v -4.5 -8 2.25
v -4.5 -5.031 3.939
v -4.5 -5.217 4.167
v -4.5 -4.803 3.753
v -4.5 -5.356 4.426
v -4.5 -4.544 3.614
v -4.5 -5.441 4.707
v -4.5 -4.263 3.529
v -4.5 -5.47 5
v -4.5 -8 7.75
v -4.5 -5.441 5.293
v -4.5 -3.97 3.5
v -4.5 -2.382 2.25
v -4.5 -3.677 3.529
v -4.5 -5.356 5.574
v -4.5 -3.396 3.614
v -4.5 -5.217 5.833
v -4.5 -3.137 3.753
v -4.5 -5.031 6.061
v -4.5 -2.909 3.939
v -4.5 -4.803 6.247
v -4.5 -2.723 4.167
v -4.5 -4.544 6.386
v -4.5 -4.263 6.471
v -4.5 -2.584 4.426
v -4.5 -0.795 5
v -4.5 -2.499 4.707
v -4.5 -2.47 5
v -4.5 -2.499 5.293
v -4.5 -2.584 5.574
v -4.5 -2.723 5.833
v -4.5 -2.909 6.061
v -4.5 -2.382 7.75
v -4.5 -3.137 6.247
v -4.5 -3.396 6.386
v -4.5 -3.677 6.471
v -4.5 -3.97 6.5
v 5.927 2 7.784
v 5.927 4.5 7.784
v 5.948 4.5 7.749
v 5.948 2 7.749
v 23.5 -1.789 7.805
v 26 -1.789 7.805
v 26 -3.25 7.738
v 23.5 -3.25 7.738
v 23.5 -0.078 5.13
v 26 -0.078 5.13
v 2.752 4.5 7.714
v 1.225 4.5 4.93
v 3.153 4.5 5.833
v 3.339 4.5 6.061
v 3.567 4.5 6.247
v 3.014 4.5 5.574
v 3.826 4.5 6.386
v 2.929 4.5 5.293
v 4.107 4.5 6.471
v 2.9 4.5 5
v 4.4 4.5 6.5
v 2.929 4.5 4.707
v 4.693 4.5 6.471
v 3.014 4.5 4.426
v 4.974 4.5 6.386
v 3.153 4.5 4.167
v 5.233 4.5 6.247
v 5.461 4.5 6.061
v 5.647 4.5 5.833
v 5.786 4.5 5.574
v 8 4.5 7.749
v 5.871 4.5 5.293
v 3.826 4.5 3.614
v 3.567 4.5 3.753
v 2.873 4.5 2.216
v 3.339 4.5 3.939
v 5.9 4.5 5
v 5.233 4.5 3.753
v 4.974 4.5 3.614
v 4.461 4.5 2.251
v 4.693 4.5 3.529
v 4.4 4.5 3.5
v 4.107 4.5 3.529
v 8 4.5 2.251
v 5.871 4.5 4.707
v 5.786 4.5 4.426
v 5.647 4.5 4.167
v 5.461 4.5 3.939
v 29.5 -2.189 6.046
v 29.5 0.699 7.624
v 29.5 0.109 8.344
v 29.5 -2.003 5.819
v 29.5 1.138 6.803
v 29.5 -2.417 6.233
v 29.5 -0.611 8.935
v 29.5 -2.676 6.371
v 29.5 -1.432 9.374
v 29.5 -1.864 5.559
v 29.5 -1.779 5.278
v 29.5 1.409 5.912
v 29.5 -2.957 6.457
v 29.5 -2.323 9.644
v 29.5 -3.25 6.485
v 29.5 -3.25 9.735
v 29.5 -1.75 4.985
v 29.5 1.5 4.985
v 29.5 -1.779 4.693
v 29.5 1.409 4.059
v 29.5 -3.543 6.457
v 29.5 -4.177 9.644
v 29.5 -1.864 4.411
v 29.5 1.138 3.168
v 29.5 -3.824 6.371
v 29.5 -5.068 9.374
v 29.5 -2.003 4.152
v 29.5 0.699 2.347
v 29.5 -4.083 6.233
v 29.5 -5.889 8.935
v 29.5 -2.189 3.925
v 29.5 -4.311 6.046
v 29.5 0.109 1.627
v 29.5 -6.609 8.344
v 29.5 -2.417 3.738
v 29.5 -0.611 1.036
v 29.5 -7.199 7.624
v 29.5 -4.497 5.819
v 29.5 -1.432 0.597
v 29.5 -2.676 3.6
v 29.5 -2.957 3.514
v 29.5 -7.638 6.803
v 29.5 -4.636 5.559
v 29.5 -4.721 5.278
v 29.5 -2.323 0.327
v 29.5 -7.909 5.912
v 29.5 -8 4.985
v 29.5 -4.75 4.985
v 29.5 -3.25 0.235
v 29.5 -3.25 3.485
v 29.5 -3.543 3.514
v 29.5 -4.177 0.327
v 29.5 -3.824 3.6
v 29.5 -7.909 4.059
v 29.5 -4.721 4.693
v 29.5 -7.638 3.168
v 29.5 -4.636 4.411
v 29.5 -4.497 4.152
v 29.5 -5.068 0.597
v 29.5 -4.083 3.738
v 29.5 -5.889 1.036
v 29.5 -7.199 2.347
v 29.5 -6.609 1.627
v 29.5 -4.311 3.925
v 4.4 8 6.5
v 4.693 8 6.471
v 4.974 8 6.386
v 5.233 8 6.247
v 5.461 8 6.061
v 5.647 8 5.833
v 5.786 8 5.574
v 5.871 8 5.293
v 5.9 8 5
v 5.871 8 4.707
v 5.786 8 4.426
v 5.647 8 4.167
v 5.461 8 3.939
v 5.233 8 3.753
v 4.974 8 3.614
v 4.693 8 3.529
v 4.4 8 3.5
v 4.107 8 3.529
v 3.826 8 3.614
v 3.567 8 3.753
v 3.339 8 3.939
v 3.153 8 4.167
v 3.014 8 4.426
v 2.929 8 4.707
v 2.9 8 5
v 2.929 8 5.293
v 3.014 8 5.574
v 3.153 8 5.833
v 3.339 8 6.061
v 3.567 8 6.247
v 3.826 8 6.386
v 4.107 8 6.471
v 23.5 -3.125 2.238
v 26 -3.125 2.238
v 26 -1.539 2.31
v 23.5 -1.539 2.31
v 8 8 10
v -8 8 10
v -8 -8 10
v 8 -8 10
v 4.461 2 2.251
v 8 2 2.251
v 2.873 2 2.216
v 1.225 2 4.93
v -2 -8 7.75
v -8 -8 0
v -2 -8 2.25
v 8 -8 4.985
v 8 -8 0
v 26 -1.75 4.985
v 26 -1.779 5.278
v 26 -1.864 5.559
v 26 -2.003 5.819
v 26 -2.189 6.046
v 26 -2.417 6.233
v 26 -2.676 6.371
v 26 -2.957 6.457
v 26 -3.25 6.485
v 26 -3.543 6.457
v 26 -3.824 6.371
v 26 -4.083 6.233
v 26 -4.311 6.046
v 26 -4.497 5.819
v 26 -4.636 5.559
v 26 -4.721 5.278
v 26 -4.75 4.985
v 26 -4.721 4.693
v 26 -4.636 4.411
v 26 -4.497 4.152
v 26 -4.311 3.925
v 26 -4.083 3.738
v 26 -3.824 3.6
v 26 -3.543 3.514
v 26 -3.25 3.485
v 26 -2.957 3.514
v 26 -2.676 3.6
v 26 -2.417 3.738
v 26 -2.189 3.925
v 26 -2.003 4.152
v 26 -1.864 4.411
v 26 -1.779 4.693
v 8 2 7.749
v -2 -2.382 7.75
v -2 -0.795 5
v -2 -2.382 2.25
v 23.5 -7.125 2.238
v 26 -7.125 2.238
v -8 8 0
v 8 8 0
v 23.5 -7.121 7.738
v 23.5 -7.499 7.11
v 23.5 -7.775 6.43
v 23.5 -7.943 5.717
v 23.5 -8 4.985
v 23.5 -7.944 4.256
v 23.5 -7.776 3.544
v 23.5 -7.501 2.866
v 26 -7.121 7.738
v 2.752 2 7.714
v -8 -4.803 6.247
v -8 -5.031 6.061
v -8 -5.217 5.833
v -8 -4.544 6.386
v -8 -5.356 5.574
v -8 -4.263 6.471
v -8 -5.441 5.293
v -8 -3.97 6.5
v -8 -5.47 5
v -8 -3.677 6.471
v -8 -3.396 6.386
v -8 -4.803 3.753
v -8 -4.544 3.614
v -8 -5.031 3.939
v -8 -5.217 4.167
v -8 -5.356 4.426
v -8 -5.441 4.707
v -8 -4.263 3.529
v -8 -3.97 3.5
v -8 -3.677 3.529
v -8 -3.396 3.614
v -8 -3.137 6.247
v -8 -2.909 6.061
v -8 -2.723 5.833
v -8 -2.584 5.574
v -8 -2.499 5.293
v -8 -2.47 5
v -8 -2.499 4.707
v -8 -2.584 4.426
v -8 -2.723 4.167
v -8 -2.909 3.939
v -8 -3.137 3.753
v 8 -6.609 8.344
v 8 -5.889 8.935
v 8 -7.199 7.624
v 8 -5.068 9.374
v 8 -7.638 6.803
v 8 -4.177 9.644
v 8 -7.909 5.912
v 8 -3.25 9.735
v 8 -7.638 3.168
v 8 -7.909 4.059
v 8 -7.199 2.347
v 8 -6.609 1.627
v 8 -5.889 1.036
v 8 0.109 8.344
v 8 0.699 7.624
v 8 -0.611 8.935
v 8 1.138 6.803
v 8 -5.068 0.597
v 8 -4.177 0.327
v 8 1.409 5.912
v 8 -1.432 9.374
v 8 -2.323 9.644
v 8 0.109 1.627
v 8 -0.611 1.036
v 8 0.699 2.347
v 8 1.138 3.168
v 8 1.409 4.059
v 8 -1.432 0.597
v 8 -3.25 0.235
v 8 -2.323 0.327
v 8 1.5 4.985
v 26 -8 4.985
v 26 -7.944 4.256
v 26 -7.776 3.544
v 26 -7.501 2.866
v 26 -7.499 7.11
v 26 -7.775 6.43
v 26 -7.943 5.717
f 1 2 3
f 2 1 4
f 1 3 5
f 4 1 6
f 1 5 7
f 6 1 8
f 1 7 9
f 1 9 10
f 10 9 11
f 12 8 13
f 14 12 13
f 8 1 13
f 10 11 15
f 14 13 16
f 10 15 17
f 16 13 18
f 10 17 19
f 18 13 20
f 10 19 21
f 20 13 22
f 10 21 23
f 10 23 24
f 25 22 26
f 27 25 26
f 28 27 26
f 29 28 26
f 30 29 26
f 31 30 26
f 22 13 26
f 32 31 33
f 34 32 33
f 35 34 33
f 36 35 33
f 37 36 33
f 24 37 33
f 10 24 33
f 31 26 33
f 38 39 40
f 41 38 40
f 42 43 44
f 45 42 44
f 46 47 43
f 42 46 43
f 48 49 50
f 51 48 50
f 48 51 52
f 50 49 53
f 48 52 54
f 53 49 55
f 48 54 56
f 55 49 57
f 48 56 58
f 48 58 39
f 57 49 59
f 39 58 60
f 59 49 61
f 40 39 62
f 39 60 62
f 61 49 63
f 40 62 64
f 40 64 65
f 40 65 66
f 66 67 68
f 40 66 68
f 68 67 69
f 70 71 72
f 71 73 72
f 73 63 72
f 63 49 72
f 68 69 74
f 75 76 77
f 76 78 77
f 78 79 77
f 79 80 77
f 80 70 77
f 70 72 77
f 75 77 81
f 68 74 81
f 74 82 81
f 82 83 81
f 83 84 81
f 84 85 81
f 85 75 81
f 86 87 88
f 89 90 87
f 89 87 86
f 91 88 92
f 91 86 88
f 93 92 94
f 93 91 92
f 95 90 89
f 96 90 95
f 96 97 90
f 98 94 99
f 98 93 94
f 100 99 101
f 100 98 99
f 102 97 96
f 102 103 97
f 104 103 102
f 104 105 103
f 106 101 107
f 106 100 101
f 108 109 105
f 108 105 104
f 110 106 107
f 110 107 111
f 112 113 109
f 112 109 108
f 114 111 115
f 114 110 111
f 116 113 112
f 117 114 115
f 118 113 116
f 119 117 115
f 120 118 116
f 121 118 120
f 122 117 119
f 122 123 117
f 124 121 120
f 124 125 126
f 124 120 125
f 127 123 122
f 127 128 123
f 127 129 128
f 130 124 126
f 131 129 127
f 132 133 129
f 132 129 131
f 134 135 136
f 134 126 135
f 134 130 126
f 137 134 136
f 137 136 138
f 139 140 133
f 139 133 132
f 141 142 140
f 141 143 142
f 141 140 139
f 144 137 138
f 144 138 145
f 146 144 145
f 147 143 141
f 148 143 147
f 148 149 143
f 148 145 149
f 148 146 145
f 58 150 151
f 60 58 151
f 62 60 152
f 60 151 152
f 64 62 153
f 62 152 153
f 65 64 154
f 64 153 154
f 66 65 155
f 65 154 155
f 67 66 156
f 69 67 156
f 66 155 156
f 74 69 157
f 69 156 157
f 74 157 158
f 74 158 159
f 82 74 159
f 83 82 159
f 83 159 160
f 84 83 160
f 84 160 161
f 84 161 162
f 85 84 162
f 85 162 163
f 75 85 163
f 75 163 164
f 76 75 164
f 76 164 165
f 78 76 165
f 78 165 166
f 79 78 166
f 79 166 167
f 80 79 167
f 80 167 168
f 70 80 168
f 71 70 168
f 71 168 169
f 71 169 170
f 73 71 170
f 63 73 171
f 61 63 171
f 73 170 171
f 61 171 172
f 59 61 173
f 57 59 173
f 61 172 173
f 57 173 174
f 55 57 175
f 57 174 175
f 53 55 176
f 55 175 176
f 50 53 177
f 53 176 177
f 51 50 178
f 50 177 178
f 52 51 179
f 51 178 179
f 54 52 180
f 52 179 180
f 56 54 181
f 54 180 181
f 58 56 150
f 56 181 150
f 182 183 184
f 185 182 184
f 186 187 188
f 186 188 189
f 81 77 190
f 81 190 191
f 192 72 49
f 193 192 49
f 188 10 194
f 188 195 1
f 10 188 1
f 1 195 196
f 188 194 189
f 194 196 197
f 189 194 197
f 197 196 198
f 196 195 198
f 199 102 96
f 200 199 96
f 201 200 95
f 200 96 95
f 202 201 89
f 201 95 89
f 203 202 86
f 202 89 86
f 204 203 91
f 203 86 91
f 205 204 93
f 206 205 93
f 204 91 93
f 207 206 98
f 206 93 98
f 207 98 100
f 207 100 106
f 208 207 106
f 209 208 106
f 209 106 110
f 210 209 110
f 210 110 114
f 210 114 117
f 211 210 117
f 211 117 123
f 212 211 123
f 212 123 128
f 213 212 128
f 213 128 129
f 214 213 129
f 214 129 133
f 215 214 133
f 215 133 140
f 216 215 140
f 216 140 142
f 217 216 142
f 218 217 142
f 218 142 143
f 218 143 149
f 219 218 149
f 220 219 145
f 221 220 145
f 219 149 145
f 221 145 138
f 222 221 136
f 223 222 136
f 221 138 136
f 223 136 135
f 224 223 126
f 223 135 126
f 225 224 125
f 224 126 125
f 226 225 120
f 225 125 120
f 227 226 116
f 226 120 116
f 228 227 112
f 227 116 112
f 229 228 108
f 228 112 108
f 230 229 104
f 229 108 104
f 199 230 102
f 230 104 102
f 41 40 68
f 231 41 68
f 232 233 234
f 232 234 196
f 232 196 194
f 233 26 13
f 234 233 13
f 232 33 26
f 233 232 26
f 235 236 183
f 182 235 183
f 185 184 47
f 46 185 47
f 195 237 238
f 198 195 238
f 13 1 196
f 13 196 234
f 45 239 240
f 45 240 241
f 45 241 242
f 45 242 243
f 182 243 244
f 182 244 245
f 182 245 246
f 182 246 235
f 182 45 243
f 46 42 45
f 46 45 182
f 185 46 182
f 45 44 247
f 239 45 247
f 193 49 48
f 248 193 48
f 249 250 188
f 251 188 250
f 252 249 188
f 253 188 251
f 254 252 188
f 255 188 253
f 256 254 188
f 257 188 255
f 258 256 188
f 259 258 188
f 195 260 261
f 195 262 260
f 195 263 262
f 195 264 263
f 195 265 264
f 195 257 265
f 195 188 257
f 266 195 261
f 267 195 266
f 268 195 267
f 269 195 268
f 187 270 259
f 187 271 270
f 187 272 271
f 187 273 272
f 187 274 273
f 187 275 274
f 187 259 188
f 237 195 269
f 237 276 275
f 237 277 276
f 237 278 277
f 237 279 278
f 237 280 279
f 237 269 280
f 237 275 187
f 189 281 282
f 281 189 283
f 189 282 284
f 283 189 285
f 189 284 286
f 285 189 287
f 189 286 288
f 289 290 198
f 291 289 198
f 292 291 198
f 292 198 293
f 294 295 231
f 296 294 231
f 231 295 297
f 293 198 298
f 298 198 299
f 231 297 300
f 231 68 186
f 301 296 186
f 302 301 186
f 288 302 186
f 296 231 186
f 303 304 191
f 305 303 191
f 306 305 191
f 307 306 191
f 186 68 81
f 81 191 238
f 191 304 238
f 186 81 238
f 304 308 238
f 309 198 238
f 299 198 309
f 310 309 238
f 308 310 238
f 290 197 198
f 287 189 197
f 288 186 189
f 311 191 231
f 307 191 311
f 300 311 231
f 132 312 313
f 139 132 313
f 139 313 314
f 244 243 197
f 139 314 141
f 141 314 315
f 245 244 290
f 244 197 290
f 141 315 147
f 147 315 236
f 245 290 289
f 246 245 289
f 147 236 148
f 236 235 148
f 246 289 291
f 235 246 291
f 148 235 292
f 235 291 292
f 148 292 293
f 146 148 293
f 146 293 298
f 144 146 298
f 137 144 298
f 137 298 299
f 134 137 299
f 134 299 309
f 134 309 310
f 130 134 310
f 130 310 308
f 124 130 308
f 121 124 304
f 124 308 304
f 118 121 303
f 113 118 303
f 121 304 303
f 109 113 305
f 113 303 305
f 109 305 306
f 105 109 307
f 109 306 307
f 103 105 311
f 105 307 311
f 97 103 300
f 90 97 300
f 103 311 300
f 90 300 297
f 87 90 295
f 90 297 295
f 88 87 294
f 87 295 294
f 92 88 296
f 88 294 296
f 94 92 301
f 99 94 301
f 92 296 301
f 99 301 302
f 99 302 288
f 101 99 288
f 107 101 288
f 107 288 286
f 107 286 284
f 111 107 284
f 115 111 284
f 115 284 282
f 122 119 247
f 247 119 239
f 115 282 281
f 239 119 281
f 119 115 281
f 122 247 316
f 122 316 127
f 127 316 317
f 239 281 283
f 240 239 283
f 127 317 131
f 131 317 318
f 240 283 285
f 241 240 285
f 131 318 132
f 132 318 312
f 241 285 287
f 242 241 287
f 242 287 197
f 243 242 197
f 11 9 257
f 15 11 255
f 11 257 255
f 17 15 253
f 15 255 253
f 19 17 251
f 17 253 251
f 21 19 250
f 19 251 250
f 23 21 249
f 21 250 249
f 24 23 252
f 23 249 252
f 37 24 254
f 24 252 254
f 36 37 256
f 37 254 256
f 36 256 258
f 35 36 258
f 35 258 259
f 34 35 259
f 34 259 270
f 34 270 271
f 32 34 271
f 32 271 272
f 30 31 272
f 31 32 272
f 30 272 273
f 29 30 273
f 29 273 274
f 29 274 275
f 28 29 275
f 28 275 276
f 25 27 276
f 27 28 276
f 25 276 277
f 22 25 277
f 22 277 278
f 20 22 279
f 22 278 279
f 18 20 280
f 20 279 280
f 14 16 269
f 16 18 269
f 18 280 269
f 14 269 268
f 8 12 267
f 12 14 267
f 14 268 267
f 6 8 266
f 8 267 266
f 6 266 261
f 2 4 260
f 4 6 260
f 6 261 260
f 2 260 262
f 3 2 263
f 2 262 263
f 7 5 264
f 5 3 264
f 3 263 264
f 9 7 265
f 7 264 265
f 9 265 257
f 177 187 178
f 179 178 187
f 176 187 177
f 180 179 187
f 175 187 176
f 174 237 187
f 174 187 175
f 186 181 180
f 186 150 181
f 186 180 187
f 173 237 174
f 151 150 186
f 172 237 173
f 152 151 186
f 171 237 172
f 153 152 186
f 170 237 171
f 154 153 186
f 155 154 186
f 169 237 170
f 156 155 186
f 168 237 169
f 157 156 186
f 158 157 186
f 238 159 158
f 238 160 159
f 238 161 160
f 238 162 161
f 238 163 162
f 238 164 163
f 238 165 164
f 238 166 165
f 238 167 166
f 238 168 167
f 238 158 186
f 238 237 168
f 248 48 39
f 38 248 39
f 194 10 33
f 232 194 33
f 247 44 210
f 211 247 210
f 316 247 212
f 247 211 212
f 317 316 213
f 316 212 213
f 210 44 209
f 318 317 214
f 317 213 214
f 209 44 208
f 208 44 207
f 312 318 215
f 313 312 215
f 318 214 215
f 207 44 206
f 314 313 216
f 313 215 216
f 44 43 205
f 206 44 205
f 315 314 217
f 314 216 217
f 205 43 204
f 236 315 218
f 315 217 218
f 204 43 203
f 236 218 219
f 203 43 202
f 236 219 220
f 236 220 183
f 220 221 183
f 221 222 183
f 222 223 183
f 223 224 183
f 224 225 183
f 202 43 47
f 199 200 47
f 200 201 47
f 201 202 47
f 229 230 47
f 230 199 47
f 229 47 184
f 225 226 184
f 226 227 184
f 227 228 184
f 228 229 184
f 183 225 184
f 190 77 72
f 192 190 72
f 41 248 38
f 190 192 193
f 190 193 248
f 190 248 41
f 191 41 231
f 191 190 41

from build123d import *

# Parameters (mm, degrees)
SKETCH1_W           = 16
SKETCH1_H           = 16
BOSS_EXTRUDE1_DEPTH = 10
SKETCH2_R           = 1.5
CUT_EXTRUDE1_DEPTH  = 6
SKETCH3_R           = 1.5
CUT_EXTRUDE2_DEPTH  = 6
CUT_EXTRUDE3_START  = -3.5
CUT_EXTRUDE3_DEPTH  = 2.5
CUT_EXTRUDE5_START  = -3.5
SKETCH6_W           = 5.5
SKETCH6_H           = 8.06
CUT_EXTRUDE5_DEPTH  = 2.5
CUT_EXTRUDE6_START  = -3.5
SKETCH7_W           = 7.078957324
SKETCH7_H           = 5.4986679
CUT_EXTRUDE6_DEPTH  = 2.5
SKETCH9_R           = 4.75
BOSS_EXTRUDE2_DEPTH = 21.5
SKETCH10_R          = 1.5
CUT_EXTRUDE7_DEPTH  = 6
CUT_EXTRUDE9_START  = -3.5
SKETCH11_R          = 1.5
CUT_EXTRUDE9_DEPTH  = 2.5


with BuildPart() as part:
    # Sketch1 → Boss-Extrude1 (new body)
    with BuildSketch(Plane.XY):
        Rectangle(SKETCH1_W, SKETCH1_H)
    extrude(amount=BOSS_EXTRUDE1_DEPTH)

    # Sketch2 → Cut-Extrude1 (cut)
    with BuildSketch(Plane.ZY.offset(8)):
        with Locations(Location((5, -3.97, 0), (0, 0, 270))):
            Circle(SKETCH2_R)
    extrude(amount=-CUT_EXTRUDE1_DEPTH, mode=Mode.SUBTRACT)

    # Sketch3 → Cut-Extrude2 (cut)
    with BuildSketch(Plane(origin=(0, 8, 0), x_dir=(1, 0, 0), z_dir=(0, 1, 0))):
        with Locations(Location((4.4, -5, 0), (0, 0, 270))):
            Circle(SKETCH3_R)
    extrude(amount=-CUT_EXTRUDE2_DEPTH, mode=Mode.SUBTRACT)

    # Sketch4 → Cut-Extrude3 (cut)
    with BuildSketch(Plane.ZY.offset(8).offset(CUT_EXTRUDE3_START)):
        Polygon((7.75, -2.38228676), (5, -0.794573519), (2.25, -2.38228676), (2.25, -5.55771324), (5, -7.145426481), (7.75, -5.55771324), align=None)
    extrude(amount=-CUT_EXTRUDE3_DEPTH, mode=Mode.SUBTRACT)

    # Sketch6 → Cut-Extrude5 (cut)
    with BuildSketch(Plane.ZY.offset(8).offset(CUT_EXTRUDE5_START)):
        with Locations((5, -8)):
            Rectangle(SKETCH6_W, SKETCH6_H)
    extrude(amount=-CUT_EXTRUDE5_DEPTH, mode=Mode.SUBTRACT)

    # Sketch7 → Cut-Extrude6 (cut)
    with BuildSketch(Plane(origin=(0, 8, 0), x_dir=(1, 0, 0), z_dir=(0, 1, 0)).offset(CUT_EXTRUDE6_START)):
        Polygon((7.574657392, -5.069884021), (6.047850034, -2.285608061), (2.873192642, -2.21572404), (1.225342608, -4.930115979), (2.752149966, -7.714391939), (5.926807358, -7.78427596), align=None)
        with Locations((8, -5)):
            Rectangle(SKETCH7_W, SKETCH7_H)
    extrude(amount=-CUT_EXTRUDE6_DEPTH, mode=Mode.SUBTRACT)

    # Sketch9 → Boss-Extrude2 (add)
    with BuildSketch(Plane(origin=(8, 0, 0), x_dir=(0, 0, -1), z_dir=(1, 0, 0))):
        with Locations(Location((-4.985464698, -3.25, 0), (0, 0, 270))):
            Circle(SKETCH9_R)
    extrude(amount=BOSS_EXTRUDE2_DEPTH)

    # Sketch10 → Cut-Extrude7 (cut)
    with BuildSketch(Plane(origin=(29.5, 0, 0), x_dir=(0, 0, -1), z_dir=(1, 0, 0))):
        with Locations(Location((-4.985464698, -3.25, 0), (0, 0, 90))):
            Circle(SKETCH10_R)
    extrude(amount=-CUT_EXTRUDE7_DEPTH, mode=Mode.SUBTRACT)

    # Sketch11 → Cut-Extrude9 (cut)
    with BuildSketch(Plane(origin=(29.5, 0, 0), x_dir=(0, 0, -1), z_dir=(1, 0, 0)).offset(CUT_EXTRUDE9_START)):
        with BuildLine():
            Line((-2.31047639, -1.538926979), (-5.129803248, -0.07785566))
            Line((-5.129803248, -0.07785566), (-7.804791556, -1.78892868))
            Line((-7.804791556, -1.78892868), (-7.738307115, -3.250064634))
            Line((-7.738307115, -3.250064634), (-7.738307115, -7.120963527))
            ThreePointArc((-7.738307115, -7.120963527), (-4.988950766, -7.999998721), (-2.238307115, -7.125000027))
            Line((-2.238307115, -7.125000027), (-2.238307115, -3.12499915))
            Line((-2.238307115, -3.12499915), (-2.31047639, -1.538926979))
        make_face()
        with Locations(Location((-4.985464698, -3.25, 0), (0, 0, 90))):
            Circle(SKETCH11_R, mode=Mode.SUBTRACT)
    extrude(amount=-CUT_EXTRUDE9_DEPTH, mode=Mode.SUBTRACT)


solid = part.part
